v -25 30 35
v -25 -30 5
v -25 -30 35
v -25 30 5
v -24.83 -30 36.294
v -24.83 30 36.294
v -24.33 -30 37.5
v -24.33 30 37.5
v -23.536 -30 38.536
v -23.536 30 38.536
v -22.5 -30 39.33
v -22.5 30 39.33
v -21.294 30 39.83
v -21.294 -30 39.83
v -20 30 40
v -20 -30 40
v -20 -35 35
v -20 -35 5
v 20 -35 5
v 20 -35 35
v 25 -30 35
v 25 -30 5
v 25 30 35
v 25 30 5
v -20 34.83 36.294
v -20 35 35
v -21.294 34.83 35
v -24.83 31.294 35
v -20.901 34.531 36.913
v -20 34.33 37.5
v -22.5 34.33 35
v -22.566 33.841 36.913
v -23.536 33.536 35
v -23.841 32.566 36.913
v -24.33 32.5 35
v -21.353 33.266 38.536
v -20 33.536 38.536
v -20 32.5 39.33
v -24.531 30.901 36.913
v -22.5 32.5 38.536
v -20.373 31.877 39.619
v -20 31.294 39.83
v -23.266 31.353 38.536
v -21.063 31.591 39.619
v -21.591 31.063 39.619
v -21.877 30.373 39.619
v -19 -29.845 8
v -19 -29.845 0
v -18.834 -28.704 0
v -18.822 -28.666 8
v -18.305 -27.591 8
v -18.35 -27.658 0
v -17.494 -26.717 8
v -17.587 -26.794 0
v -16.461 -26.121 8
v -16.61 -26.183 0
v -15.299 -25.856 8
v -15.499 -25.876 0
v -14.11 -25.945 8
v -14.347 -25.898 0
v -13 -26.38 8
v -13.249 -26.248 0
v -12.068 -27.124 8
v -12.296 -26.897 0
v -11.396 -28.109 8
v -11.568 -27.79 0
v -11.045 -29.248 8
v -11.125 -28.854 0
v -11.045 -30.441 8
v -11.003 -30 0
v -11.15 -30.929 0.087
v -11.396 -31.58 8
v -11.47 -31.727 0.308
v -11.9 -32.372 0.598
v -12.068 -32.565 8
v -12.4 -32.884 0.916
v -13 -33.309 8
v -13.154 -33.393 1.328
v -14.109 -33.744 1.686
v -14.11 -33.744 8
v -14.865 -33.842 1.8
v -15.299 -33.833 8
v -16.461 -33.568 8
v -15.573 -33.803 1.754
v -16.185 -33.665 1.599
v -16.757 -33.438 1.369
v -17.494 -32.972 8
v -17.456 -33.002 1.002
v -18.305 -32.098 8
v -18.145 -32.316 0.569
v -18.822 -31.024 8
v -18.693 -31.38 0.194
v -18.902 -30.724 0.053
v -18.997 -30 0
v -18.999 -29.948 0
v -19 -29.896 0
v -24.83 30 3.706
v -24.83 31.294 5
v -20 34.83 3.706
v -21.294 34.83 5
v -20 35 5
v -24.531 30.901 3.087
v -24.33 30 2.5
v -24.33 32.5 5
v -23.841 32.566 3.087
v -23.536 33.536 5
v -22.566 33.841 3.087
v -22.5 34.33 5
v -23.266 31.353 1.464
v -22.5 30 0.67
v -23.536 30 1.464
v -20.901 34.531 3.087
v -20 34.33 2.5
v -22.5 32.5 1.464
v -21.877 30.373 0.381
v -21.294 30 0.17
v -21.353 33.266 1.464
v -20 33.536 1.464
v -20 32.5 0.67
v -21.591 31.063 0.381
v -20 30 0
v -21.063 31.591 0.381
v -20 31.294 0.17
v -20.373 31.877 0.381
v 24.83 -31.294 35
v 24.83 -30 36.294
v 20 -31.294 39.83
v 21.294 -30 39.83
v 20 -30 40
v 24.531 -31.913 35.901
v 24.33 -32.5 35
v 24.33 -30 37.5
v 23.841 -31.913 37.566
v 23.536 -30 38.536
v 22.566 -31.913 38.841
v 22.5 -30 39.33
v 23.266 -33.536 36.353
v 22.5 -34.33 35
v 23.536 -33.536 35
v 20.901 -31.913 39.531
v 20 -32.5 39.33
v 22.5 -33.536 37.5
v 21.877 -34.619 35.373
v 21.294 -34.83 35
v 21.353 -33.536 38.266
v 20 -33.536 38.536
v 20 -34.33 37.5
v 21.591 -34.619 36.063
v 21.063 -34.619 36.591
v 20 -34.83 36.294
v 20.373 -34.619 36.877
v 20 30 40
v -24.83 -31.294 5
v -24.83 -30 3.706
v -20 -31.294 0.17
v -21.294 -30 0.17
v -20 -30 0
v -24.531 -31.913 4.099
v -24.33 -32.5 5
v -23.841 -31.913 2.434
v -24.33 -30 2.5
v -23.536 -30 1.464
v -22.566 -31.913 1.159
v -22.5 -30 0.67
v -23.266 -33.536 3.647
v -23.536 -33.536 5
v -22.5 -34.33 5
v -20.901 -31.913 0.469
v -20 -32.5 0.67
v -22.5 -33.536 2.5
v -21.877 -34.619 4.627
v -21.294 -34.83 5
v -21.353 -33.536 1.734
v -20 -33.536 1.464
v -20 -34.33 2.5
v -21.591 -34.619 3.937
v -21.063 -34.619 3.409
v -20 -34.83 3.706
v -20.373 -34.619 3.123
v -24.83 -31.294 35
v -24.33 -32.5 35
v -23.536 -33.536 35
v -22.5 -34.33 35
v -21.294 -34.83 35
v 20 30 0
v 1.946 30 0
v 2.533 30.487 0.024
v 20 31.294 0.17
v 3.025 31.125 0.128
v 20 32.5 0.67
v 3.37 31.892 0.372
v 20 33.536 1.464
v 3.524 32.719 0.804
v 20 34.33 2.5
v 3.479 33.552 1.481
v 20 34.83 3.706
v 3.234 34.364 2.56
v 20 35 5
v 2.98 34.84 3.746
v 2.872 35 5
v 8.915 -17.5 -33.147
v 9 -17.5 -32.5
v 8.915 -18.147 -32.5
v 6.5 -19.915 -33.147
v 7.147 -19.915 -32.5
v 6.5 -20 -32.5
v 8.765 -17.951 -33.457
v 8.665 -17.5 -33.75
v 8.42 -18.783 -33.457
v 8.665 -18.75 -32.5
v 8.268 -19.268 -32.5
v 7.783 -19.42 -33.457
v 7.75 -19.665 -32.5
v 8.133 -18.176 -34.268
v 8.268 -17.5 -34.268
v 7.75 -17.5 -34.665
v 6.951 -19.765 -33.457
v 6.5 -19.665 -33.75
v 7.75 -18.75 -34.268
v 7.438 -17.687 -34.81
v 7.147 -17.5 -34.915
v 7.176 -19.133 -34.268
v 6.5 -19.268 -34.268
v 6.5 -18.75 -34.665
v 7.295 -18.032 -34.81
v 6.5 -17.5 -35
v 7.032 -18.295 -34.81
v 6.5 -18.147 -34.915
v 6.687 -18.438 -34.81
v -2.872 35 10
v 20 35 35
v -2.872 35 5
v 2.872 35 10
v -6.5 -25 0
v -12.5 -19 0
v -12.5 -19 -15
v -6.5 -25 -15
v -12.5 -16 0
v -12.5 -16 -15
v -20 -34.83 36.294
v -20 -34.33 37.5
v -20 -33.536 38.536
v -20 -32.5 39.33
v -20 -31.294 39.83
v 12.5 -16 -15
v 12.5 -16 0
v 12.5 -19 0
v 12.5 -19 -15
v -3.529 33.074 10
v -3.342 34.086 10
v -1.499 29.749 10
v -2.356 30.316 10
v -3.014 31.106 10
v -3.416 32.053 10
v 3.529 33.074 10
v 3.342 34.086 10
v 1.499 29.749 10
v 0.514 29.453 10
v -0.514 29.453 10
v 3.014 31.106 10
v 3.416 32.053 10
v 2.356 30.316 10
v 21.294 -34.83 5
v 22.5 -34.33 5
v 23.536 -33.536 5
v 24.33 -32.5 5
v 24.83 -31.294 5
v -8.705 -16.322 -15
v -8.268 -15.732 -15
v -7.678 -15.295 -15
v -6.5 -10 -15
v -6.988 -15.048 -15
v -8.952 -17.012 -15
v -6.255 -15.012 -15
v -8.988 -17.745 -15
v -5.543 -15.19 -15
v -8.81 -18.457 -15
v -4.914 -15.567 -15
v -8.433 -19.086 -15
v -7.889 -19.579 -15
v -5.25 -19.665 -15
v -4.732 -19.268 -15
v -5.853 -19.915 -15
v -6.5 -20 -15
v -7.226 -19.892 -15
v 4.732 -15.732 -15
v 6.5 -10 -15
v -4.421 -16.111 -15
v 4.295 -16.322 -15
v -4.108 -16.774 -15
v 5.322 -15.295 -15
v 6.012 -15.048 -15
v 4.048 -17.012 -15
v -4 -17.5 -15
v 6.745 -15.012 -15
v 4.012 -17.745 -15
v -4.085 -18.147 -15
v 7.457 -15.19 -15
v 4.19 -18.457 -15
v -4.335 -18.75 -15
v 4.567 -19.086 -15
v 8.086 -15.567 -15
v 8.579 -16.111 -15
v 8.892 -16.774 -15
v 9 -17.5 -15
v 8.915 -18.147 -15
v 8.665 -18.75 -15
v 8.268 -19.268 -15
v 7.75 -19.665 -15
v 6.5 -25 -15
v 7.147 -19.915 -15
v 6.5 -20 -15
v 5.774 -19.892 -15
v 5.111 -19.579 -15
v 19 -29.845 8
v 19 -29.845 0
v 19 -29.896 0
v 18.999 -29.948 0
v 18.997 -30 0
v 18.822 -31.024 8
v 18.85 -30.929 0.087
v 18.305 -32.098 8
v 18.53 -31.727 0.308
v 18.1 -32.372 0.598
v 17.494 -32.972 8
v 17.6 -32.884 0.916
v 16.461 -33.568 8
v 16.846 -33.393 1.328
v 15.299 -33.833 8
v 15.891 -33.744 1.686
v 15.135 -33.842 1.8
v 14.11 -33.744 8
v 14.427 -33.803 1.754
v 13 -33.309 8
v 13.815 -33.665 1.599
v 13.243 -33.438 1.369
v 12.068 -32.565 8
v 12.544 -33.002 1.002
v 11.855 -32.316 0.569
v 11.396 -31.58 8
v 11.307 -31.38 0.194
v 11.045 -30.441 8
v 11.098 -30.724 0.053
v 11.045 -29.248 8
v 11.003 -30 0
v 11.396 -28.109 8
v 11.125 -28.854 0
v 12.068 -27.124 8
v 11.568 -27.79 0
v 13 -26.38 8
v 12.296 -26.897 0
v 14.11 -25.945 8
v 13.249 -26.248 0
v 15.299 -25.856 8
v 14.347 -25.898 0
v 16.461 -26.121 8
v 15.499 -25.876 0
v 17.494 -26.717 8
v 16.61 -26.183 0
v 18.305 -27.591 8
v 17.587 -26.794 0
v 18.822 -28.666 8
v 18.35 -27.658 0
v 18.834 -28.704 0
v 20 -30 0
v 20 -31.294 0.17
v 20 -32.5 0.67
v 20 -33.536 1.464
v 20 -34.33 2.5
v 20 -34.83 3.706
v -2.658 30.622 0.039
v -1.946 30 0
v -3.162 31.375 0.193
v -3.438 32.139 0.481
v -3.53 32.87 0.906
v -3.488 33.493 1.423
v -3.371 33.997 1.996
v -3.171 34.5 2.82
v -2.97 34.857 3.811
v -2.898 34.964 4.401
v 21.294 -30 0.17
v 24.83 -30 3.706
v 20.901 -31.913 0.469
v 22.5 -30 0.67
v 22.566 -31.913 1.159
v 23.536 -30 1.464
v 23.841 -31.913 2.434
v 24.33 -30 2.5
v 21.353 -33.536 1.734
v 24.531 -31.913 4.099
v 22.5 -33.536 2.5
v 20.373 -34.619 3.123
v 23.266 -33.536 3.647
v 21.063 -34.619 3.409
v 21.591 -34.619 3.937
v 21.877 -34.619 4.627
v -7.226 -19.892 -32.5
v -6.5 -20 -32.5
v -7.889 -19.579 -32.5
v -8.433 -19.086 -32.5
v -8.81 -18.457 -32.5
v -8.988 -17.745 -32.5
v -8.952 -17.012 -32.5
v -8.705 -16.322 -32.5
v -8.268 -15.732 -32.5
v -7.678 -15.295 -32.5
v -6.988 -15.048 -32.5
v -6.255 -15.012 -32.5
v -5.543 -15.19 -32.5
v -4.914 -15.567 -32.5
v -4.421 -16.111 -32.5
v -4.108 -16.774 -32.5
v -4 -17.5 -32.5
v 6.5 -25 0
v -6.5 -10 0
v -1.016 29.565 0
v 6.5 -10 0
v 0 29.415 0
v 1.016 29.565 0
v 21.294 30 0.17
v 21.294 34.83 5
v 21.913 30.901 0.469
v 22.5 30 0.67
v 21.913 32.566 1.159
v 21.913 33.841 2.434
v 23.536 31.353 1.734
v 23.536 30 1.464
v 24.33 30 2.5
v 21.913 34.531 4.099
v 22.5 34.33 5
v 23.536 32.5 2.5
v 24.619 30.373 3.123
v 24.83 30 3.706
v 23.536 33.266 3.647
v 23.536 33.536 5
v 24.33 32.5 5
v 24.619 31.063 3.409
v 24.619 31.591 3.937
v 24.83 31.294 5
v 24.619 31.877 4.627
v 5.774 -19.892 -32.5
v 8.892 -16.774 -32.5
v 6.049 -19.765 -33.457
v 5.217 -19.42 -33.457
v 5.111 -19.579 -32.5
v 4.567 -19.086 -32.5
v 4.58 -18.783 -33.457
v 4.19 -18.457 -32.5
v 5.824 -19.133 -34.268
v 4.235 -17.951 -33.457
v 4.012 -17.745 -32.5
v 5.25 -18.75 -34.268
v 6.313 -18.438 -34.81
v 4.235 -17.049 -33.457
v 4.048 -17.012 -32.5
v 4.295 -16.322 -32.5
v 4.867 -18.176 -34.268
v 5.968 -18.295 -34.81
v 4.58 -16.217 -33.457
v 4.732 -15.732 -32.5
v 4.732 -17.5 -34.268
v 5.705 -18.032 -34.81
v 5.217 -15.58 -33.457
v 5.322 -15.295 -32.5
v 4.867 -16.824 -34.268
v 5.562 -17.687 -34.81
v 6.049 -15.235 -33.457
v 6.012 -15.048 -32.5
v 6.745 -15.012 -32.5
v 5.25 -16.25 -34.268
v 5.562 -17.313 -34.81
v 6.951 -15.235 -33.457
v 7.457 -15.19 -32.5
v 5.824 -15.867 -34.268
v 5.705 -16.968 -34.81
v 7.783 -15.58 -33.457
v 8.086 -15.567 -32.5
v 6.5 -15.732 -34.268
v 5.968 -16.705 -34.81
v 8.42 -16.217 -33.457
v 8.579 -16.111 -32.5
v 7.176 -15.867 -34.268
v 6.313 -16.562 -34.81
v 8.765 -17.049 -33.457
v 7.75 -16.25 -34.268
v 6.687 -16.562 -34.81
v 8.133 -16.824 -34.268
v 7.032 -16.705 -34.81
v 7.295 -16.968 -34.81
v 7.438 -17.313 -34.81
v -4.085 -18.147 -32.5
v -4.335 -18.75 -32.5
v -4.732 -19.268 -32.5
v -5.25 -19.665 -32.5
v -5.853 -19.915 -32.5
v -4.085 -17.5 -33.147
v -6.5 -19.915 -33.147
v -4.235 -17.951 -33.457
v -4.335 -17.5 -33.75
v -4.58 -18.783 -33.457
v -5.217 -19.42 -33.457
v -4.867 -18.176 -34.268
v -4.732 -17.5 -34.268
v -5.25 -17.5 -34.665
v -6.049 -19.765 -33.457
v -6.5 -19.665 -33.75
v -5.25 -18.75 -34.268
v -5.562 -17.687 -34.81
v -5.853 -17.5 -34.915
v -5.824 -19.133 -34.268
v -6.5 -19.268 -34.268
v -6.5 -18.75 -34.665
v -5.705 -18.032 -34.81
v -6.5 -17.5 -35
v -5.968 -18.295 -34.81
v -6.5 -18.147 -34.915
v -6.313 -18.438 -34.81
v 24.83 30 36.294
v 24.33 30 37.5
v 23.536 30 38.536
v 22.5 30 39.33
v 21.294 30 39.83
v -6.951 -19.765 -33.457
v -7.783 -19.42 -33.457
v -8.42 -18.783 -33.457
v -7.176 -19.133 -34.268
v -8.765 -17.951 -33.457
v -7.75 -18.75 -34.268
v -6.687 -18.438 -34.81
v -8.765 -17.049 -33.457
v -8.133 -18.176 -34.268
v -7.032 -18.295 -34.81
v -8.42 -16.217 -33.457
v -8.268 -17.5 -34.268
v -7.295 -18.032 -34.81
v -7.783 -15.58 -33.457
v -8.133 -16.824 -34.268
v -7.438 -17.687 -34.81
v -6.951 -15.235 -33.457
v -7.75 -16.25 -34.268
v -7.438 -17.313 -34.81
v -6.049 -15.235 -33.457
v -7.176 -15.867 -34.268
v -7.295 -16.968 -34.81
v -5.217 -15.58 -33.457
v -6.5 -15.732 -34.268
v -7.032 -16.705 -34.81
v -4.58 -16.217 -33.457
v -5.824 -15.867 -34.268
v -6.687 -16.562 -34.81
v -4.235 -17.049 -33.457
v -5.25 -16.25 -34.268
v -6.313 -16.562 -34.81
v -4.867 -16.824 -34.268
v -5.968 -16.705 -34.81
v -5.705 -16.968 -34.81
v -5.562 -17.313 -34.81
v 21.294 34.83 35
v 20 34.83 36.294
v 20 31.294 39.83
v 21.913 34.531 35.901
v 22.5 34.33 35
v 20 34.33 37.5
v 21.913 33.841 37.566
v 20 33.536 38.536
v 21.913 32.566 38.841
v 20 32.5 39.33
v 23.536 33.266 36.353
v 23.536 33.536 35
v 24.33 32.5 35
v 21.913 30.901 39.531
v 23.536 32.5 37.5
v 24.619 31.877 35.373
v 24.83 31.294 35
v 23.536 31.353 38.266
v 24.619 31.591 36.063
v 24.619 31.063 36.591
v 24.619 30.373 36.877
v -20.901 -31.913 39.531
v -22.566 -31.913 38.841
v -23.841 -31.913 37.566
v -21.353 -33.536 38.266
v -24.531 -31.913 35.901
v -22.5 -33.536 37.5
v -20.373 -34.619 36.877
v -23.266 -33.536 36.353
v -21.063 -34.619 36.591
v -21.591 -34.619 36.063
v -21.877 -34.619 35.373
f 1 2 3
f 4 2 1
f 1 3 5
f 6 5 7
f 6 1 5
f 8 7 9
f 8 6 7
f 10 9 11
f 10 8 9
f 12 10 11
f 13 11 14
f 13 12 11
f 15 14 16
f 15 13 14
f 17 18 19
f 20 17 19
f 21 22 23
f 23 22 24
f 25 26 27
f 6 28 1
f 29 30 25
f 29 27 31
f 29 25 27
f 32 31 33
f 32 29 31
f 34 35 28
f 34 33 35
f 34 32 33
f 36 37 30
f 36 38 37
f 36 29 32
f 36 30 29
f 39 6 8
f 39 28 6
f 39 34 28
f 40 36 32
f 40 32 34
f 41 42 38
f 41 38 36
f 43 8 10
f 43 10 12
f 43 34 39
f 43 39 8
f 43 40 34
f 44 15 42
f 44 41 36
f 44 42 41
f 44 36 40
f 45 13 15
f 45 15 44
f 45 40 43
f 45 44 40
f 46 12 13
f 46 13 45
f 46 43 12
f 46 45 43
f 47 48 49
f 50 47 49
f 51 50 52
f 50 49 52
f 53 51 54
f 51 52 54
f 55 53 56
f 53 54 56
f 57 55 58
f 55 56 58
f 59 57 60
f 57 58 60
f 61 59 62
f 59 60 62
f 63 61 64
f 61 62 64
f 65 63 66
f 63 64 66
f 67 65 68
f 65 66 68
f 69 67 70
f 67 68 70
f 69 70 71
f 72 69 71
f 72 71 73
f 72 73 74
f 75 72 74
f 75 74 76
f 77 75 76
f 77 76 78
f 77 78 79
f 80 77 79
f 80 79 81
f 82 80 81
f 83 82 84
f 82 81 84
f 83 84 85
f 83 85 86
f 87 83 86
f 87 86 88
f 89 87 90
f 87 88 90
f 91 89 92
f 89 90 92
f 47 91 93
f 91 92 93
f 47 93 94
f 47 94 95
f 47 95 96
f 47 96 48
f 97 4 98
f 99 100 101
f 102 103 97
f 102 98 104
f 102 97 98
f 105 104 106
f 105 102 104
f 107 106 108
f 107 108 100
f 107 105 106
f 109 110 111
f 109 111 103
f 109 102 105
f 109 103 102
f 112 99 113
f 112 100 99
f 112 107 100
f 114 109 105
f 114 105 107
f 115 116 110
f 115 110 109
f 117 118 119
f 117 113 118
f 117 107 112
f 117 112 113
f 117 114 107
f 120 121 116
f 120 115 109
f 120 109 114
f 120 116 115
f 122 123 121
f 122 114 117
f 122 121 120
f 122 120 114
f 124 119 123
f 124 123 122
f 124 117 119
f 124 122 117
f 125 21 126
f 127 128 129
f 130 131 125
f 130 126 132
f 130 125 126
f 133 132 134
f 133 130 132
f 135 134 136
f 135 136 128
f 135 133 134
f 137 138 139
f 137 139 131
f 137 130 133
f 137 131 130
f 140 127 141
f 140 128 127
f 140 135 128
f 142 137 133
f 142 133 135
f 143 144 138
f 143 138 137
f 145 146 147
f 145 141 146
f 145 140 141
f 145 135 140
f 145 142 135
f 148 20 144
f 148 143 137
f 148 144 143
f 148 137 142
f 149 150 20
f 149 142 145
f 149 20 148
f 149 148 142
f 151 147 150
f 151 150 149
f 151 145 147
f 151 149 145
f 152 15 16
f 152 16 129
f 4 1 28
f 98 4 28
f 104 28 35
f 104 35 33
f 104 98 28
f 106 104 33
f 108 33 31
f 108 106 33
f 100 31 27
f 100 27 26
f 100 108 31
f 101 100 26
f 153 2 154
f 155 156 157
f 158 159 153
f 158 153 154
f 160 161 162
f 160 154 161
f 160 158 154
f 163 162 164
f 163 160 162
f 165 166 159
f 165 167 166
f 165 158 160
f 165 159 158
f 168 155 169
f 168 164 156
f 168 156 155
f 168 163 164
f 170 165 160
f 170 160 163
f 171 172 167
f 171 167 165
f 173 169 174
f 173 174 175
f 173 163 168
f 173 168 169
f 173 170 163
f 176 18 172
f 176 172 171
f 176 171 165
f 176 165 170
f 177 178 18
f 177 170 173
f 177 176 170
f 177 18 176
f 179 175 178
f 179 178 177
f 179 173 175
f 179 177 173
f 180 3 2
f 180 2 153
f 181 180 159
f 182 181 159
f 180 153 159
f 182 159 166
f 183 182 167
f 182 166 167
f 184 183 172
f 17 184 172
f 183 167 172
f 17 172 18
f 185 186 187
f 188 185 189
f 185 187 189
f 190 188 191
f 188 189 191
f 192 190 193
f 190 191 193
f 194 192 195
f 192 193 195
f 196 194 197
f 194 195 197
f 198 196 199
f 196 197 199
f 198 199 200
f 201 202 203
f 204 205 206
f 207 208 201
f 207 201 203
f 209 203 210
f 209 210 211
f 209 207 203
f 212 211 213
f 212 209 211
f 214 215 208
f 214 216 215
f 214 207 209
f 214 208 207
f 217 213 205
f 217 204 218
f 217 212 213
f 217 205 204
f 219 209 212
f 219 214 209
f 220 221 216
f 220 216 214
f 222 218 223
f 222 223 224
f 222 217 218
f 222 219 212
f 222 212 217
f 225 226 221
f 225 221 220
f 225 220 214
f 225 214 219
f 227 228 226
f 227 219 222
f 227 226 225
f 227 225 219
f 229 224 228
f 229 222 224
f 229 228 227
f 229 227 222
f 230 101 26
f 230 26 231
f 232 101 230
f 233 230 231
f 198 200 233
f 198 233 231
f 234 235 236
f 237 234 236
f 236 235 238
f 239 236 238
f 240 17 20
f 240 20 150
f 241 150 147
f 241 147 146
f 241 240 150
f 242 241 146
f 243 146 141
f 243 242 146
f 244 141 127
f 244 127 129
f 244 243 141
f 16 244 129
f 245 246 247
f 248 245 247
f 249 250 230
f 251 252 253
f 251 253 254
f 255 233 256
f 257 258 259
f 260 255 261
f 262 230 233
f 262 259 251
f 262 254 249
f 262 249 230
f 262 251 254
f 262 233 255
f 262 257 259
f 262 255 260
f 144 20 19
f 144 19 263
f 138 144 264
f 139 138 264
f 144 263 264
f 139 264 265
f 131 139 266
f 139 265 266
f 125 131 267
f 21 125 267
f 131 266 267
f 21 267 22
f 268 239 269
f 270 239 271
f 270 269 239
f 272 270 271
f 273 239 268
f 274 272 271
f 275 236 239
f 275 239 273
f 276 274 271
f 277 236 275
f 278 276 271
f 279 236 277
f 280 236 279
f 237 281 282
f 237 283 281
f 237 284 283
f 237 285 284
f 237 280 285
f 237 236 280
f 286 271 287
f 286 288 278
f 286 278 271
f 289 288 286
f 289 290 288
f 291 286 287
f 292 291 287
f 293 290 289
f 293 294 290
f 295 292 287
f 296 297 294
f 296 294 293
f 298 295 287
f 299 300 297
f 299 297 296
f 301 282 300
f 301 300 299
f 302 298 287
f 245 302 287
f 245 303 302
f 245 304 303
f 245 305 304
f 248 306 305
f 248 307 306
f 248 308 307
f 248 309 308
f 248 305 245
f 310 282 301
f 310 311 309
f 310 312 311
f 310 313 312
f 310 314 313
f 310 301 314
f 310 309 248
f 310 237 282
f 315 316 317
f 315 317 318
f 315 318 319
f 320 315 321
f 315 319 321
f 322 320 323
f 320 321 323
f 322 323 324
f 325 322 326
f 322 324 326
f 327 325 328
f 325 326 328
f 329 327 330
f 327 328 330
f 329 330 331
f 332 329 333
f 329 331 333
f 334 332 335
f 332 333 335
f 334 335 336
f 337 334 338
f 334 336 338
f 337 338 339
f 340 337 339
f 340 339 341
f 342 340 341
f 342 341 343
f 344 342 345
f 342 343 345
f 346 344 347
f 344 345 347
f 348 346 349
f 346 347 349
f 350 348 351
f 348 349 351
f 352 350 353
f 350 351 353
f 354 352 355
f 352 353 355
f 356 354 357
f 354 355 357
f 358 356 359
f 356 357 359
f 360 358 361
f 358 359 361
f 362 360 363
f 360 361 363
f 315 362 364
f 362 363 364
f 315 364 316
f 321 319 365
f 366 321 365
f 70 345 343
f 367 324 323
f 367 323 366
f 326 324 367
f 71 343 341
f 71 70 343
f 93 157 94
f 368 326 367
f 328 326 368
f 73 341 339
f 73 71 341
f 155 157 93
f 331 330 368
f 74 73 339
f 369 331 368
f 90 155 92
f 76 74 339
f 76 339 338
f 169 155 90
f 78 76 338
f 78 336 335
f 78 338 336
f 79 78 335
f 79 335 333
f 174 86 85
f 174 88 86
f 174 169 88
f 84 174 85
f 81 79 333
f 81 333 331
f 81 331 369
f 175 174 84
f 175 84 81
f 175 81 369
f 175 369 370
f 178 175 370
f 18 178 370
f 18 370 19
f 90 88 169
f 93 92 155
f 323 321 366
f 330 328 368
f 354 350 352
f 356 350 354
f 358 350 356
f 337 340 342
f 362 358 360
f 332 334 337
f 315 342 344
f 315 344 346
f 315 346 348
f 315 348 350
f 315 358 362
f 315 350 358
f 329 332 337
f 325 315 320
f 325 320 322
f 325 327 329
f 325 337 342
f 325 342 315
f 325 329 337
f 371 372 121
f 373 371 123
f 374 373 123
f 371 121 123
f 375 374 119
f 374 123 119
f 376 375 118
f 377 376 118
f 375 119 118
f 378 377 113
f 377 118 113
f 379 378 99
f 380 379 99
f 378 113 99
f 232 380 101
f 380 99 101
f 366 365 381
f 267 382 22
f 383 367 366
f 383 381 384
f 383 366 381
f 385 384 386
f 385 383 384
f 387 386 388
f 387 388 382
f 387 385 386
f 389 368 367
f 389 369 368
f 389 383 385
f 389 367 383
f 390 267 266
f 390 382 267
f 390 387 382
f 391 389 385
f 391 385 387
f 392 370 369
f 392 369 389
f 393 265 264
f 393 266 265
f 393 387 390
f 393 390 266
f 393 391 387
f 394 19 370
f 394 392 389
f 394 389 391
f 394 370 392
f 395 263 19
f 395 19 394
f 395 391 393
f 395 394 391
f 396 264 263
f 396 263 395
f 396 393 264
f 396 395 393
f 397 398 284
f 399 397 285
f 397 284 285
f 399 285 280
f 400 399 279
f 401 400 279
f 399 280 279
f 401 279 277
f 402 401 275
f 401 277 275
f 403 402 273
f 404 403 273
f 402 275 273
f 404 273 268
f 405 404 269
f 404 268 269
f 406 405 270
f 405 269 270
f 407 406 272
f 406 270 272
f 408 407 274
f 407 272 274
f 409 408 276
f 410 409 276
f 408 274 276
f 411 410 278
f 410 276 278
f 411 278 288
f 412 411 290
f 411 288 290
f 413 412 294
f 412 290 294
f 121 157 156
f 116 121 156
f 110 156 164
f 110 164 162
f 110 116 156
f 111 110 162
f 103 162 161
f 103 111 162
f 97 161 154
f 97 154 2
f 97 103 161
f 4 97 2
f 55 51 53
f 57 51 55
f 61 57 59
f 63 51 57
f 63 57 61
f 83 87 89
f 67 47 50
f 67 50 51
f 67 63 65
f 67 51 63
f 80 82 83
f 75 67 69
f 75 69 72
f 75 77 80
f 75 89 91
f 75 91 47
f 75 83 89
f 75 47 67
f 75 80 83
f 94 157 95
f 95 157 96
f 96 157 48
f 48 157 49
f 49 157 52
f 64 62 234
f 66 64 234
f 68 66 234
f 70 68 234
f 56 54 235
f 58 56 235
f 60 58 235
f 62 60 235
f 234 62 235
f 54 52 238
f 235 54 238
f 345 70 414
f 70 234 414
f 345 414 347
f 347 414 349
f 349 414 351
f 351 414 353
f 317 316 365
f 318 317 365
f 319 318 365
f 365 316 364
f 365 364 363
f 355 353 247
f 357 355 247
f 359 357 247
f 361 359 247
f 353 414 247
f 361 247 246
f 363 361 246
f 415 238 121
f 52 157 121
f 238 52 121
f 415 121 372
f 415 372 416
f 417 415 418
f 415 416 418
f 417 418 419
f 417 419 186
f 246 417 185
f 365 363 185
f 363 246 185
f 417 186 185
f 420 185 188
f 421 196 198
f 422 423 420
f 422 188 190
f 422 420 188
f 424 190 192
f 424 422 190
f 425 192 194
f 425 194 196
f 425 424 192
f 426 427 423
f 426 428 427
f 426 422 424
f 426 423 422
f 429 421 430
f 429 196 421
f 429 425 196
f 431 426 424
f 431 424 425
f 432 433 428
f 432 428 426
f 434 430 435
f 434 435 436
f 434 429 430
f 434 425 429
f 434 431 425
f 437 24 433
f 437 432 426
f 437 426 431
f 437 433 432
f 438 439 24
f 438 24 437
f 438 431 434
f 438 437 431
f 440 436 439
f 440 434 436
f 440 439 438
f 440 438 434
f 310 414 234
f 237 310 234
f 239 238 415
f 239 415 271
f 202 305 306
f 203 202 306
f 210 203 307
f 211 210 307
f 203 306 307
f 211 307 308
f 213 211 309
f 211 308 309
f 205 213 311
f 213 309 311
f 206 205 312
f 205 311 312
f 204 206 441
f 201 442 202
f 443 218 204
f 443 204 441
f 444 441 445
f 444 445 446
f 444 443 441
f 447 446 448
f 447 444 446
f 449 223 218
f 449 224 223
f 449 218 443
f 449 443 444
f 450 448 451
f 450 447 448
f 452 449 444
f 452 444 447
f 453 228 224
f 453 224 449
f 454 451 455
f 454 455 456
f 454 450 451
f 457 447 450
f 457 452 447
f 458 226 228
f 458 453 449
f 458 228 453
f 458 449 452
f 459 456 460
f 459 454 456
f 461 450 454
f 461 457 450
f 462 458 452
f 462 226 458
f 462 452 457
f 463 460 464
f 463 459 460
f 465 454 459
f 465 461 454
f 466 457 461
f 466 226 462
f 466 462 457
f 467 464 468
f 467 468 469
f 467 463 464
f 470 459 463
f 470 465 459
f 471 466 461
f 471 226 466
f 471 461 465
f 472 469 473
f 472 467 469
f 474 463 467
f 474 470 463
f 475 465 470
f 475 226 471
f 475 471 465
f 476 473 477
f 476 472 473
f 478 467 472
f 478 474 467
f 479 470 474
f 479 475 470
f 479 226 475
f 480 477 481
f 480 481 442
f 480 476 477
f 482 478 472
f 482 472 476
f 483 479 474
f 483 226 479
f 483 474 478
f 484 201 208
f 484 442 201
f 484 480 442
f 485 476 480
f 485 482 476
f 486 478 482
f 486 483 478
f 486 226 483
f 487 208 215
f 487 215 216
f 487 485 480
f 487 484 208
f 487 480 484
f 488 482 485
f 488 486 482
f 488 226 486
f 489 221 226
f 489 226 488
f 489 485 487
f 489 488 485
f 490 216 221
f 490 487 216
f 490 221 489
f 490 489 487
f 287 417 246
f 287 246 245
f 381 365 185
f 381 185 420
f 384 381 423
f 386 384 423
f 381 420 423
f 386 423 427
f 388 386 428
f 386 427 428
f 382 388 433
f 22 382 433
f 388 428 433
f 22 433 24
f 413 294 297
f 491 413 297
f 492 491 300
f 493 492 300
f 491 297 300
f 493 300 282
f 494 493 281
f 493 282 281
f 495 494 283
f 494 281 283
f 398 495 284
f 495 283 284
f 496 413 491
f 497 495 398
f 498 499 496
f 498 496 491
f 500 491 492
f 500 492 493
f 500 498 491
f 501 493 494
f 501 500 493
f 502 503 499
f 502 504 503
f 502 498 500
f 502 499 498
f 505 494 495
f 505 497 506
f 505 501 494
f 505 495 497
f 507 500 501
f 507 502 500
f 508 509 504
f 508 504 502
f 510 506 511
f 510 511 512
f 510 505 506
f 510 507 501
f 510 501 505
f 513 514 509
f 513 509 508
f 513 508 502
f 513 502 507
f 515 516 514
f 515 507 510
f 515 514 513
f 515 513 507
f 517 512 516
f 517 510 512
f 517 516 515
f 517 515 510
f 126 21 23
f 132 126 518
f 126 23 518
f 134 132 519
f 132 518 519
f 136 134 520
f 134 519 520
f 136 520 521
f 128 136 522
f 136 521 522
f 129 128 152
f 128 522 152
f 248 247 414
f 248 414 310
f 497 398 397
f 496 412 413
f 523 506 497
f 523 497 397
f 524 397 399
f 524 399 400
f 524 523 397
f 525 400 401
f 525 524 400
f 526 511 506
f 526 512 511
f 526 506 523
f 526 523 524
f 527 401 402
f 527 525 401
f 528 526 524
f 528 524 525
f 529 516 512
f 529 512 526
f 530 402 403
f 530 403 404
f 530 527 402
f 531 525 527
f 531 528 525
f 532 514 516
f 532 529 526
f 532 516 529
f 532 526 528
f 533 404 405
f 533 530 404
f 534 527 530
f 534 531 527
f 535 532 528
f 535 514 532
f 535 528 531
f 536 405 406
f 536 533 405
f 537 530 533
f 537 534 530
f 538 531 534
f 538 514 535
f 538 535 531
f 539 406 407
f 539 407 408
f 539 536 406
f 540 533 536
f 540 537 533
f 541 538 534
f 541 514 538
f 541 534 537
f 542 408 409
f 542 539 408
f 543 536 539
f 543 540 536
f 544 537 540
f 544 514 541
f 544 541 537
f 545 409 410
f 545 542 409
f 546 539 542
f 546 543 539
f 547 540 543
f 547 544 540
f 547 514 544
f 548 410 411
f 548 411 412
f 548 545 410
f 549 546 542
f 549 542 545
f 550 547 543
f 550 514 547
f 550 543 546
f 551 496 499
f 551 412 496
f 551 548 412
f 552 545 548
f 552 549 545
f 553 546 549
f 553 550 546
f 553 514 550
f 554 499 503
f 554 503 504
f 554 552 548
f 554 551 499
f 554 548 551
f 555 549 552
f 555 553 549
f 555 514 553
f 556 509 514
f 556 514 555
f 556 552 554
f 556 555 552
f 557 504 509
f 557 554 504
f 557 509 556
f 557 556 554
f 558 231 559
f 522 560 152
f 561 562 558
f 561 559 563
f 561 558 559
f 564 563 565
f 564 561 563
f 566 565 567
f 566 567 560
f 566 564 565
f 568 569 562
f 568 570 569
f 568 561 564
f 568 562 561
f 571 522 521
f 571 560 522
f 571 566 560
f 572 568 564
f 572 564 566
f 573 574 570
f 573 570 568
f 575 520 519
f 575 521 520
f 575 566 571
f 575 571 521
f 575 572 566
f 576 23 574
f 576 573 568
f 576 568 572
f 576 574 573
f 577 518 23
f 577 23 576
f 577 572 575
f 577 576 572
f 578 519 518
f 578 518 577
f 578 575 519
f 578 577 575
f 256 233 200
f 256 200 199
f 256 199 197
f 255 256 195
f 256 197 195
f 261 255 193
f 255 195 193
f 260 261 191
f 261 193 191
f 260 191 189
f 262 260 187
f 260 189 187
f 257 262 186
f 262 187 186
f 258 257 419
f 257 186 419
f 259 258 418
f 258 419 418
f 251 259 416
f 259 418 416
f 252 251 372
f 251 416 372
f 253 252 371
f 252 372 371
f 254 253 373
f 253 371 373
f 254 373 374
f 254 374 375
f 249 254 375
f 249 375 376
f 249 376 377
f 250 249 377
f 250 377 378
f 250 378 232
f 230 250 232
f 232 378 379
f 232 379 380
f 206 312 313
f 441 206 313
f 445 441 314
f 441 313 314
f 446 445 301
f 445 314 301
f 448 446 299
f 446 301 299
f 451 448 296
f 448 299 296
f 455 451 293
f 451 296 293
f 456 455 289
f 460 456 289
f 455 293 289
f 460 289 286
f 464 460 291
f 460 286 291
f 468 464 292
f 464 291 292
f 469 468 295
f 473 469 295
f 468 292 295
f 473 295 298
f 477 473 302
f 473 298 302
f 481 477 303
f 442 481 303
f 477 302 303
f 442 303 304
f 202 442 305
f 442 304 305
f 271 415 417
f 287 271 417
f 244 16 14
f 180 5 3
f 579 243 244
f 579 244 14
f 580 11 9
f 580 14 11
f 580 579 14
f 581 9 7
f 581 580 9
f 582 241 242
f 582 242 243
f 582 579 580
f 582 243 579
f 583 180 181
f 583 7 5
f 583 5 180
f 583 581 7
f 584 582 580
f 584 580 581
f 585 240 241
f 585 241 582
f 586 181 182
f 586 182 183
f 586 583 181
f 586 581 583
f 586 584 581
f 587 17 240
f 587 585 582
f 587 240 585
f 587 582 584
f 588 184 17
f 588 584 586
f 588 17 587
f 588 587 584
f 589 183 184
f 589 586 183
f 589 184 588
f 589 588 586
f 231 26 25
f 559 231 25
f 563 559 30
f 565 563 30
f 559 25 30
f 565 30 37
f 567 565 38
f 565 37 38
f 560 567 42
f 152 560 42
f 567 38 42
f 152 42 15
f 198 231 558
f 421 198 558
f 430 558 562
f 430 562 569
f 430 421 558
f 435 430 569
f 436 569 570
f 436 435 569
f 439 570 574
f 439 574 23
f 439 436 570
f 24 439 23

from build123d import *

# Parameters (mm, degrees)
F0_W          = 50
F0_H          = 70
F1_DEPTH      = 40
F3_DEPTH      = 15
F4_SIZE       = 6
F6_DEPTH      = 20
F7_DEPTH      = 20
F8_R          = 2.5
F10_DEPTH     = 10
F12_DEPTH     = 8
F13_T1_DEPTH  = 60
F13_T3_DEPTH  = 30
F13_T5_DEPTH  = 29.6276373277
F13_T7_DEPTH  = 29.6276373277
F13_T9_DEPTH  = 40
F13_S13_W     = 5
F13_S13_H     = 5
F13_T14_DEPTH = 5
F13_S19_W     = 5
F13_S19_H     = 5
F13_T20_DEPTH = 5
F13_S25_W     = 5
F13_S25_H     = 5
F13_T26_DEPTH = 5
F13_S31_W     = 5
F13_S31_H     = 5
F13_T32_DEPTH = 5
F13_S37_W     = 5
F13_S37_H     = 5
F13_T38_DEPTH = 5
F13_S43_W     = 5
F13_S43_H     = 5
F13_T44_DEPTH = 5
F13_S49_W     = 5
F13_S49_H     = 5
F13_T50_DEPTH = 5
F13_S55_W     = 5
F13_S55_H     = 5
F13_T56_DEPTH = 5


# Not quite as in the source:
# - a fillet or chamfer that OpenCascade refuses, or shapes differently, is made with other operations: its cross-section is extruded or revolved along the edge and cut away or added


with BuildPart() as f1:
    # F0 (on Top) → F1 (new body)
    with BuildSketch(Plane.XY):
        Rectangle(F0_W, F0_H)
    extrude(amount=F1_DEPTH)

    # F2 (on face) → F3 (join)
    with BuildSketch(Plane(origin=(0, 0, 0), x_dir=(1, 0, 0), z_dir=(0, 0, -1))):
        Polygon((-12.5, 25), (-12.5, 20), (-12.5, 10), (12.5, 10), (12.5, 17.5), (12.5, 25), align=None)
    extrude(amount=F3_DEPTH)

    # F4
    f4_edges = [f1.edges().sort_by_distance(p)[0] for p in [
        (-12.5, -25, -7.5),
        (-12.5, -10, -7.5),
        (12.5, -10, -7.5),
        (12.5, -25, -7.5),
    ]]
    chamfer(f4_edges, length=F4_SIZE)

    # F5 (on face) → F6 (join)
    with BuildSketch(Plane(origin=(0, 0, -15), x_dir=(1, 0, 0), z_dir=(0, 0, -1))):
        with BuildLine():
            ThreePointArc((-4, 17.5), (-4.732233047, 19.267766953), (-6.5, 20))
            ThreePointArc((-6.5, 20), (-8.267766953, 15.732233047), (-4, 17.5))
        make_face()
    extrude(amount=F6_DEPTH)

    # F5 (on face) → F7 (join)
    with BuildSketch(Plane(origin=(0, 0, -15), x_dir=(1, 0, 0), z_dir=(0, 0, -1))):
        with BuildLine():
            ThreePointArc((9, 17.5), (8.267766953, 19.267766953), (6.5, 20))
            ThreePointArc((6.5, 20), (4.732233047, 15.732233047), (9, 17.5))
        make_face()
    extrude(amount=F7_DEPTH)

    # F8
    f8_edges = [f1.edges().sort_by_distance(p)[0] for p in [
        (-9, -17.5, -35),
        (4, -17.5, -35),
    ]]
    fillet(f8_edges, radius=F8_R)

    # F9 (on face) → F10 (cut)
    with BuildSketch(Plane(origin=(0, 0, 0), x_dir=(1, 0, 0), z_dir=(0, 0, -1))):
        with BuildLine():
            Line((-2.8723626723, -35), (2.8723626723, -35))
            ThreePointArc((2.8723626723, -35), (0, -29.4152137969), (-2.8723626723, -35))
        make_face()
    extrude(amount=-F10_DEPTH, mode=Mode.SUBTRACT)

    # F11 (on face) → F12 (cut)
    with BuildSketch(Plane(origin=(0, 0, 0), x_dir=(1, 0, 0), z_dir=(0, 0, -1))):
        with BuildLine():
            ThreePointArc((11, 29.8445560038), (15, 25.8445560038), (19, 29.8445560038))
            Line((19, 29.8445560038), (15, 29.8445560038))
            Line((15, 29.8445560038), (11, 29.8445560038))
        make_face()
        with BuildLine():
            Line((-15, 29.8445560038), (-11, 29.8445560038))
            ThreePointArc((-11, 29.8445560038), (-15, 33.8445560038), (-19, 29.8445560038))
            Line((-19, 29.8445560038), (-15, 29.8445560038))
        make_face()
        with BuildLine():
            ThreePointArc((-19, 29.8445560038), (-15, 25.8445560038), (-11, 29.8445560038))
            Line((-11, 29.8445560038), (-15, 29.8445560038))
            Line((-15, 29.8445560038), (-19, 29.8445560038))
        make_face()
        with BuildLine():
            Line((15, 29.8445560038), (19, 29.8445560038))
            ThreePointArc((19, 29.8445560038), (15, 33.8445560038), (11, 29.8445560038))
            Line((11, 29.8445560038), (15, 29.8445560038))
        make_face()
    extrude(amount=-F12_DEPTH, mode=Mode.SUBTRACT)

    # F13: fillet of radius 5 on 13 edges, made by hand

    # F13_s2 → F13_t1 (cut)
    with BuildSketch(Plane.XZ.offset(-30)):
        with BuildLine():
            ThreePointArc((20, 0), (23.5355339059, 1.4644660941), (25, 5))
            Line((25, 5), (25, 0))
            Line((25, 0), (20, 0))
        make_face()
        with BuildLine():
            ThreePointArc((25, 35), (23.5355339059, 38.5355339059), (20, 40))
            Line((20, 40), (25, 40))
            Line((25, 40), (25, 35))
        make_face()
        with BuildLine():
            ThreePointArc((-20, 0), (-23.5355339059, 1.4644660941), (-25, 5))
            Line((-25, 5), (-25, 0))
            Line((-25, 0), (-20, 0))
        make_face()
        with BuildLine():
            ThreePointArc((-25, 35), (-23.5355339059, 38.5355339059), (-20, 40))
            Line((-20, 40), (-25, 40))
            Line((-25, 40), (-25, 35))
        make_face()
    extrude(amount=F13_T1_DEPTH, mode=Mode.SUBTRACT)

    # F13_s4 → F13_t3 (cut)
    with BuildSketch(Plane.XY.offset(5)):
        with BuildLine():
            ThreePointArc((20, -35), (23.5355339059, -33.5355339059), (25, -30))
            Line((25, -30), (25, -35))
            Line((25, -35), (20, -35))
        make_face()
        with BuildLine():
            ThreePointArc((20, 35), (23.5355339059, 33.5355339059), (25, 30))
            Line((25, 30), (25, 35))
            Line((25, 35), (20, 35))
        make_face()
        with BuildLine():
            ThreePointArc((-25, -30), (-23.5355339059, -33.5355339059), (-20, -35))
            Line((-20, -35), (-25, -35))
            Line((-25, -35), (-25, -30))
        make_face()
        with BuildLine():
            ThreePointArc((-25, 30), (-23.5355339059, 33.5355339059), (-20, 35))
            Line((-20, 35), (-25, 35))
            Line((-25, 35), (-25, 30))
        make_face()
    extrude(amount=F13_T3_DEPTH, mode=Mode.SUBTRACT)

    # F13_s6 → F13_t5 (cut)
    with BuildSketch(Plane.YZ.offset(-9.6276373277)):
        with BuildLine():
            ThreePointArc((30, 0), (33.5355339059, 1.4644660941), (35, 5))
            Line((35, 5), (35, 0))
            Line((35, 0), (30, 0))
        make_face()
    extrude(amount=F13_T5_DEPTH, mode=Mode.SUBTRACT)

    # F13_s8 → F13_t7 (cut)
    with BuildSketch(Plane.YZ.offset(-20)):
        with BuildLine():
            ThreePointArc((30, 0), (33.5355339059, 1.4644660941), (35, 5))
            Line((35, 5), (35, 0))
            Line((35, 0), (30, 0))
        make_face()
    extrude(amount=F13_T7_DEPTH, mode=Mode.SUBTRACT)

    # F13_s10 → F13_t9 (cut)
    with BuildSketch(Plane.YZ.offset(-20)):
        with BuildLine():
            ThreePointArc((-30, 0), (-33.5355339059, 1.4644660941), (-35, 5))
            Line((-35, 5), (-35, 0))
            Line((-35, 0), (-30, 0))
        make_face()
        with BuildLine():
            ThreePointArc((-35, 35), (-33.5355339059, 38.5355339059), (-30, 40))
            Line((-30, 40), (-35, 40))
            Line((-35, 40), (-35, 35))
        make_face()
        with BuildLine():
            ThreePointArc((35, 35), (33.5355339059, 38.5355339059), (30, 40))
            Line((30, 40), (35, 40))
            Line((35, 40), (35, 35))
        make_face()
    extrude(amount=F13_T9_DEPTH, mode=Mode.SUBTRACT)


with BuildPart() as f13_tool12:
    # F13_s13 → F13_t14 (new body)
    with BuildSketch(Plane.XZ.offset(30)):
        with Locations((22.5, 2.5)):
            Rectangle(F13_S13_W, F13_S13_H)
    extrude(amount=F13_T14_DEPTH)

    # F13_s15 → F13_t16 (revolve, cut)
    with BuildSketch(Plane(origin=(20, -30, 5), x_dir=(-0.7071067812, 0, 0.7071067812), z_dir=(0.7071067812, 0, 0.7071067812))):
        with BuildLine():
            ThreePointArc((0, -5), (5, 0), (0, 5))
            Line((0, 5), (0, -5))
        make_face()
    revolve(axis=Axis((20, -30, 5), (0, -1, 0)), mode=Mode.SUBTRACT)


with BuildPart() as f1_1:
    add(f1.part)

    # F13_t11: cut F13_tool12
    add(f13_tool12.part, mode=Mode.SUBTRACT)


with BuildPart() as f13_tool18:
    # F13_s19 → F13_t20 (new body)
    with BuildSketch(Plane.YZ.offset(20)):
        with Locations((32.5, 2.5)):
            Rectangle(F13_S19_W, F13_S19_H)
    extrude(amount=F13_T20_DEPTH)

    # F13_s21 → F13_t22 (revolve, cut)
    with BuildSketch(Plane(origin=(20, 30, 5), x_dir=(0, -0.7071067812, 0.7071067812), z_dir=(0, 0.7071067812, 0.7071067812))):
        with BuildLine():
            ThreePointArc((0, -5), (5, 0), (0, 5))
            Line((0, 5), (0, -5))
        make_face()
    revolve(axis=Axis((20, 30, 5), (1, 0, 0)), mode=Mode.SUBTRACT)


with BuildPart() as f1_2:
    add(f1_1.part)

    # F13_t17: cut F13_tool18
    add(f13_tool18.part, mode=Mode.SUBTRACT)


with BuildPart() as f13_tool24:
    # F13_s25 → F13_t26 (new body)
    with BuildSketch(Plane.XZ.offset(30)):
        with Locations((22.5, 37.5)):
            Rectangle(F13_S25_W, F13_S25_H)
    extrude(amount=F13_T26_DEPTH)

    # F13_s27 → F13_t28 (revolve, cut)
    with BuildSketch(Plane(origin=(20, -30, 35), x_dir=(-0.7071067812, 0, -0.7071067812), z_dir=(-0.7071067812, 0, 0.7071067812))):
        with BuildLine():
            ThreePointArc((0, -5), (5, 0), (0, 5))
            Line((0, 5), (0, -5))
        make_face()
    revolve(axis=Axis((20, -30, 35), (0, -1, 0)), mode=Mode.SUBTRACT)


with BuildPart() as f1_3:
    add(f1_2.part)

    # F13_t23: cut F13_tool24
    add(f13_tool24.part, mode=Mode.SUBTRACT)


with BuildPart() as f13_tool30:
    # F13_s31 → F13_t32 (new body)
    with BuildSketch(Plane.YZ.offset(20)):
        with Locations((32.5, 37.5)):
            Rectangle(F13_S31_W, F13_S31_H)
    extrude(amount=F13_T32_DEPTH)

    # F13_s33 → F13_t34 (revolve, cut)
    with BuildSketch(Plane(origin=(20, 30, 35), x_dir=(0, -0.7071067812, -0.7071067812), z_dir=(0, -0.7071067812, 0.7071067812))):
        with BuildLine():
            ThreePointArc((0, -5), (5, 0), (0, 5))
            Line((0, 5), (0, -5))
        make_face()
    revolve(axis=Axis((20, 30, 35), (1, 0, 0)), mode=Mode.SUBTRACT)


with BuildPart() as f1_4:
    add(f1_3.part)

    # F13_t29: cut F13_tool30
    add(f13_tool30.part, mode=Mode.SUBTRACT)


with BuildPart() as f13_tool36:
    # F13_s37 → F13_t38 (new body)
    with BuildSketch(Plane.XY.offset(5)):
        with Locations((-22.5, 32.5)):
            Rectangle(F13_S37_W, F13_S37_H)
    extrude(amount=-F13_T38_DEPTH)

    # F13_s39 → F13_t40 (revolve, cut)
    with BuildSketch(Plane(origin=(-20, 30, 5), x_dir=(0.7071067812, -0.7071067812, 0), z_dir=(0.7071067812, 0.7071067812, 0))):
        with BuildLine():
            ThreePointArc((0, -5), (5, 0), (0, 5))
            Line((0, 5), (0, -5))
        make_face()
    revolve(axis=Axis((-20, 30, 5), (0, 0, -1)), mode=Mode.SUBTRACT)


with BuildPart() as f1_5:
    add(f1_4.part)

    # F13_t35: cut F13_tool36
    add(f13_tool36.part, mode=Mode.SUBTRACT)


with BuildPart() as f13_tool42:
    # F13_s43 → F13_t44 (new body)
    with BuildSketch(Plane.XZ.offset(30)):
        with Locations((-22.5, 2.5)):
            Rectangle(F13_S43_W, F13_S43_H)
    extrude(amount=F13_T44_DEPTH)

    # F13_s45 → F13_t46 (revolve, cut)
    with BuildSketch(Plane(origin=(-20, -30, 5), x_dir=(0.7071067812, 0, 0.7071067812), z_dir=(0.7071067812, 0, -0.7071067812))):
        with BuildLine():
            ThreePointArc((0, -5), (5, 0), (0, 5))
            Line((0, 5), (0, -5))
        make_face()
    revolve(axis=Axis((-20, -30, 5), (0, -1, 0)), mode=Mode.SUBTRACT)


with BuildPart() as f1_6:
    add(f1_5.part)

    # F13_t41: cut F13_tool42
    add(f13_tool42.part, mode=Mode.SUBTRACT)


with BuildPart() as f13_tool48:
    # F13_s49 → F13_t50 (new body)
    with BuildSketch(Plane.XZ.offset(30)):
        with Locations((-22.5, 37.5)):
            Rectangle(F13_S49_W, F13_S49_H)
    extrude(amount=F13_T50_DEPTH)

    # F13_s51 → F13_t52 (revolve, cut)
    with BuildSketch(Plane(origin=(-20, -30, 35), x_dir=(0.7071067812, 0, -0.7071067812), z_dir=(-0.7071067812, 0, -0.7071067812))):
        with BuildLine():
            ThreePointArc((0, -5), (5, 0), (0, 5))
            Line((0, 5), (0, -5))
        make_face()
    revolve(axis=Axis((-20, -30, 35), (0, -1, 0)), mode=Mode.SUBTRACT)


with BuildPart() as f1_7:
    add(f1_6.part)

    # F13_t47: cut F13_tool48
    add(f13_tool48.part, mode=Mode.SUBTRACT)


with BuildPart() as f13_tool54:
    # F13_s55 → F13_t56 (new body)
    with BuildSketch(Plane.XY.offset(35)):
        with Locations((-22.5, 32.5)):
            Rectangle(F13_S55_W, F13_S55_H)
    extrude(amount=F13_T56_DEPTH)

    # F13_s57 → F13_t58 (revolve, cut)
    with BuildSketch(Plane(origin=(-20, 30, 35), x_dir=(0.7071067812, -0.7071067812, 0), z_dir=(-0.7071067812, -0.7071067812, 0))):
        with BuildLine():
            ThreePointArc((0, -5), (5, 0), (0, 5))
            Line((0, 5), (0, -5))
        make_face()
    revolve(axis=Axis((-20, 30, 35), (0, 0, 1)), mode=Mode.SUBTRACT)


with BuildPart() as f1_8:
    add(f1_7.part)

    # F13_t53: cut F13_tool54
    add(f13_tool54.part, mode=Mode.SUBTRACT)


solid = f1_8.part
